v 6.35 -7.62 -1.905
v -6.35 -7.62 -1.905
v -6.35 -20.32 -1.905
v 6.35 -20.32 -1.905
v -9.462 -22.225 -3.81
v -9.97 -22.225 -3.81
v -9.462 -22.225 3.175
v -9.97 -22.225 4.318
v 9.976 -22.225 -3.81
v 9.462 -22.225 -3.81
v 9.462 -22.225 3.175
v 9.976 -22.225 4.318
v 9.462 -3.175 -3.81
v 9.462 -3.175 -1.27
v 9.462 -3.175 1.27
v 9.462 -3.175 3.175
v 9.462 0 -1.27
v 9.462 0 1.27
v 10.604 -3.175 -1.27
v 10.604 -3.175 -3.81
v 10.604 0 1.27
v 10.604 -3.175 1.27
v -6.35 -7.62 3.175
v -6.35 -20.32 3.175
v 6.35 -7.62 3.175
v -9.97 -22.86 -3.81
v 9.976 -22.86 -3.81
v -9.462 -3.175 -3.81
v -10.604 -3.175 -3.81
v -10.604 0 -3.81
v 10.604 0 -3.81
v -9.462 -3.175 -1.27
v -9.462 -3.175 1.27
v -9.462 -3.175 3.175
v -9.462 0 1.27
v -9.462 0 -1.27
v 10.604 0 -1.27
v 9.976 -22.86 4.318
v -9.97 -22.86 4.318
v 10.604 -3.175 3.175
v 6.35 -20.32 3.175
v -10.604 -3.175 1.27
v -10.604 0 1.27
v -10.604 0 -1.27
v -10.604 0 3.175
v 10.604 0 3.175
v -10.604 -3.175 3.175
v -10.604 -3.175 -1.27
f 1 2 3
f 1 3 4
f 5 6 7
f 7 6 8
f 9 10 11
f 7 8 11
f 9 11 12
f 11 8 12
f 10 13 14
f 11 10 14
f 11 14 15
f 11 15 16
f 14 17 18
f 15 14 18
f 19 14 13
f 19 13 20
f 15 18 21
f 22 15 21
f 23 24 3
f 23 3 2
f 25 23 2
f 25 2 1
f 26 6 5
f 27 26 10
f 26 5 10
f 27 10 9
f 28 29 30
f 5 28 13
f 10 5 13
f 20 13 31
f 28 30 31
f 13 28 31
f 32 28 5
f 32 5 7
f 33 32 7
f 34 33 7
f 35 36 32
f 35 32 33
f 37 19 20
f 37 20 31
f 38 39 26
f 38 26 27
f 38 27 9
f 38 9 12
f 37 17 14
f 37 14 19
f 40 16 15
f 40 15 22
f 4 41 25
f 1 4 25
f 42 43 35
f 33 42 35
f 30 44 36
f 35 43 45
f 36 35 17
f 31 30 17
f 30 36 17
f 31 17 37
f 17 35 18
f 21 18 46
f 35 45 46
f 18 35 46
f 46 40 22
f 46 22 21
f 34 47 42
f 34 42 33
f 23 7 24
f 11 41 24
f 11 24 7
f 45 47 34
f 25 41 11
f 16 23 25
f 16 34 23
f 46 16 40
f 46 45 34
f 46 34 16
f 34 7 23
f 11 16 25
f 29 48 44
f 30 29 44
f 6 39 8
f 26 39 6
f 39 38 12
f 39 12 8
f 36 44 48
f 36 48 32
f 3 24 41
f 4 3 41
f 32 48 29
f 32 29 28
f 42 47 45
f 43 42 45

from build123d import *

# Parameters (mm, degrees)
F0_W     = 18.923
F0_H     = 6.985
F1_DEPTH = 22.86
F3_DEPTH = 0.635
F4_W     = 12.7
F4_H     = 12.7
F5_DEPTH = 5.08
F4_W_2   = 1.143
F4_H_2   = 3.175
F6_DEPTH = 6.985
F7_W     = 1.143
F7_H     = 2.54
F8_DEPTH = 12.7


# Not quite as in the source:
# - a feature names something its author has since deleted; it is built from what else it names


with BuildPart() as f1:
    # F0 (on Front) → F1 (new body)
    with BuildSketch(Plane.XZ):
        with Locations((0, -0.3175)):
            Rectangle(F0_W, F0_H)
    extrude(amount=F1_DEPTH)

    # F2 (on face) → F3 (join)
    with BuildSketch(Plane.XZ.offset(22.86)):
        Polygon((9.9764279214, 4.318), (-9.9695, 4.318), (-9.9695, -3.81), (-9.4615, -3.81), (-9.4615, 3.175), (9.4615, 3.175), (9.4615, -3.81), (9.9764279214, -3.81), align=None)
    extrude(amount=-F3_DEPTH)

    # F4 (on face) → F5 (cut)
    with BuildSketch(Plane.XY.offset(3.175)):
        with Locations((0, -13.97)):
            Rectangle(F4_W, F4_H)
    extrude(amount=-F5_DEPTH, mode=Mode.SUBTRACT)

    # F4 (on face) → F6 (join, through all)
    with BuildSketch(Plane.XY.offset(3.175)):
        with Locations((-10.033, -1.5875)):
            Rectangle(F4_W_2, F4_H_2)
        with Locations((10.033, -1.5875)):
            Rectangle(F4_W_2, F4_H_2)
    extrude(amount=-F6_DEPTH)

    # F7 (on face) → F8 (cut)
    with BuildSketch(Plane.XZ):
        with Locations((10.033, 0)):
            Rectangle(F7_W, F7_H)
        with Locations((-10.033, 0)):
            Rectangle(F7_W, F7_H)
    extrude(amount=F8_DEPTH, mode=Mode.SUBTRACT)


solid = f1.part
